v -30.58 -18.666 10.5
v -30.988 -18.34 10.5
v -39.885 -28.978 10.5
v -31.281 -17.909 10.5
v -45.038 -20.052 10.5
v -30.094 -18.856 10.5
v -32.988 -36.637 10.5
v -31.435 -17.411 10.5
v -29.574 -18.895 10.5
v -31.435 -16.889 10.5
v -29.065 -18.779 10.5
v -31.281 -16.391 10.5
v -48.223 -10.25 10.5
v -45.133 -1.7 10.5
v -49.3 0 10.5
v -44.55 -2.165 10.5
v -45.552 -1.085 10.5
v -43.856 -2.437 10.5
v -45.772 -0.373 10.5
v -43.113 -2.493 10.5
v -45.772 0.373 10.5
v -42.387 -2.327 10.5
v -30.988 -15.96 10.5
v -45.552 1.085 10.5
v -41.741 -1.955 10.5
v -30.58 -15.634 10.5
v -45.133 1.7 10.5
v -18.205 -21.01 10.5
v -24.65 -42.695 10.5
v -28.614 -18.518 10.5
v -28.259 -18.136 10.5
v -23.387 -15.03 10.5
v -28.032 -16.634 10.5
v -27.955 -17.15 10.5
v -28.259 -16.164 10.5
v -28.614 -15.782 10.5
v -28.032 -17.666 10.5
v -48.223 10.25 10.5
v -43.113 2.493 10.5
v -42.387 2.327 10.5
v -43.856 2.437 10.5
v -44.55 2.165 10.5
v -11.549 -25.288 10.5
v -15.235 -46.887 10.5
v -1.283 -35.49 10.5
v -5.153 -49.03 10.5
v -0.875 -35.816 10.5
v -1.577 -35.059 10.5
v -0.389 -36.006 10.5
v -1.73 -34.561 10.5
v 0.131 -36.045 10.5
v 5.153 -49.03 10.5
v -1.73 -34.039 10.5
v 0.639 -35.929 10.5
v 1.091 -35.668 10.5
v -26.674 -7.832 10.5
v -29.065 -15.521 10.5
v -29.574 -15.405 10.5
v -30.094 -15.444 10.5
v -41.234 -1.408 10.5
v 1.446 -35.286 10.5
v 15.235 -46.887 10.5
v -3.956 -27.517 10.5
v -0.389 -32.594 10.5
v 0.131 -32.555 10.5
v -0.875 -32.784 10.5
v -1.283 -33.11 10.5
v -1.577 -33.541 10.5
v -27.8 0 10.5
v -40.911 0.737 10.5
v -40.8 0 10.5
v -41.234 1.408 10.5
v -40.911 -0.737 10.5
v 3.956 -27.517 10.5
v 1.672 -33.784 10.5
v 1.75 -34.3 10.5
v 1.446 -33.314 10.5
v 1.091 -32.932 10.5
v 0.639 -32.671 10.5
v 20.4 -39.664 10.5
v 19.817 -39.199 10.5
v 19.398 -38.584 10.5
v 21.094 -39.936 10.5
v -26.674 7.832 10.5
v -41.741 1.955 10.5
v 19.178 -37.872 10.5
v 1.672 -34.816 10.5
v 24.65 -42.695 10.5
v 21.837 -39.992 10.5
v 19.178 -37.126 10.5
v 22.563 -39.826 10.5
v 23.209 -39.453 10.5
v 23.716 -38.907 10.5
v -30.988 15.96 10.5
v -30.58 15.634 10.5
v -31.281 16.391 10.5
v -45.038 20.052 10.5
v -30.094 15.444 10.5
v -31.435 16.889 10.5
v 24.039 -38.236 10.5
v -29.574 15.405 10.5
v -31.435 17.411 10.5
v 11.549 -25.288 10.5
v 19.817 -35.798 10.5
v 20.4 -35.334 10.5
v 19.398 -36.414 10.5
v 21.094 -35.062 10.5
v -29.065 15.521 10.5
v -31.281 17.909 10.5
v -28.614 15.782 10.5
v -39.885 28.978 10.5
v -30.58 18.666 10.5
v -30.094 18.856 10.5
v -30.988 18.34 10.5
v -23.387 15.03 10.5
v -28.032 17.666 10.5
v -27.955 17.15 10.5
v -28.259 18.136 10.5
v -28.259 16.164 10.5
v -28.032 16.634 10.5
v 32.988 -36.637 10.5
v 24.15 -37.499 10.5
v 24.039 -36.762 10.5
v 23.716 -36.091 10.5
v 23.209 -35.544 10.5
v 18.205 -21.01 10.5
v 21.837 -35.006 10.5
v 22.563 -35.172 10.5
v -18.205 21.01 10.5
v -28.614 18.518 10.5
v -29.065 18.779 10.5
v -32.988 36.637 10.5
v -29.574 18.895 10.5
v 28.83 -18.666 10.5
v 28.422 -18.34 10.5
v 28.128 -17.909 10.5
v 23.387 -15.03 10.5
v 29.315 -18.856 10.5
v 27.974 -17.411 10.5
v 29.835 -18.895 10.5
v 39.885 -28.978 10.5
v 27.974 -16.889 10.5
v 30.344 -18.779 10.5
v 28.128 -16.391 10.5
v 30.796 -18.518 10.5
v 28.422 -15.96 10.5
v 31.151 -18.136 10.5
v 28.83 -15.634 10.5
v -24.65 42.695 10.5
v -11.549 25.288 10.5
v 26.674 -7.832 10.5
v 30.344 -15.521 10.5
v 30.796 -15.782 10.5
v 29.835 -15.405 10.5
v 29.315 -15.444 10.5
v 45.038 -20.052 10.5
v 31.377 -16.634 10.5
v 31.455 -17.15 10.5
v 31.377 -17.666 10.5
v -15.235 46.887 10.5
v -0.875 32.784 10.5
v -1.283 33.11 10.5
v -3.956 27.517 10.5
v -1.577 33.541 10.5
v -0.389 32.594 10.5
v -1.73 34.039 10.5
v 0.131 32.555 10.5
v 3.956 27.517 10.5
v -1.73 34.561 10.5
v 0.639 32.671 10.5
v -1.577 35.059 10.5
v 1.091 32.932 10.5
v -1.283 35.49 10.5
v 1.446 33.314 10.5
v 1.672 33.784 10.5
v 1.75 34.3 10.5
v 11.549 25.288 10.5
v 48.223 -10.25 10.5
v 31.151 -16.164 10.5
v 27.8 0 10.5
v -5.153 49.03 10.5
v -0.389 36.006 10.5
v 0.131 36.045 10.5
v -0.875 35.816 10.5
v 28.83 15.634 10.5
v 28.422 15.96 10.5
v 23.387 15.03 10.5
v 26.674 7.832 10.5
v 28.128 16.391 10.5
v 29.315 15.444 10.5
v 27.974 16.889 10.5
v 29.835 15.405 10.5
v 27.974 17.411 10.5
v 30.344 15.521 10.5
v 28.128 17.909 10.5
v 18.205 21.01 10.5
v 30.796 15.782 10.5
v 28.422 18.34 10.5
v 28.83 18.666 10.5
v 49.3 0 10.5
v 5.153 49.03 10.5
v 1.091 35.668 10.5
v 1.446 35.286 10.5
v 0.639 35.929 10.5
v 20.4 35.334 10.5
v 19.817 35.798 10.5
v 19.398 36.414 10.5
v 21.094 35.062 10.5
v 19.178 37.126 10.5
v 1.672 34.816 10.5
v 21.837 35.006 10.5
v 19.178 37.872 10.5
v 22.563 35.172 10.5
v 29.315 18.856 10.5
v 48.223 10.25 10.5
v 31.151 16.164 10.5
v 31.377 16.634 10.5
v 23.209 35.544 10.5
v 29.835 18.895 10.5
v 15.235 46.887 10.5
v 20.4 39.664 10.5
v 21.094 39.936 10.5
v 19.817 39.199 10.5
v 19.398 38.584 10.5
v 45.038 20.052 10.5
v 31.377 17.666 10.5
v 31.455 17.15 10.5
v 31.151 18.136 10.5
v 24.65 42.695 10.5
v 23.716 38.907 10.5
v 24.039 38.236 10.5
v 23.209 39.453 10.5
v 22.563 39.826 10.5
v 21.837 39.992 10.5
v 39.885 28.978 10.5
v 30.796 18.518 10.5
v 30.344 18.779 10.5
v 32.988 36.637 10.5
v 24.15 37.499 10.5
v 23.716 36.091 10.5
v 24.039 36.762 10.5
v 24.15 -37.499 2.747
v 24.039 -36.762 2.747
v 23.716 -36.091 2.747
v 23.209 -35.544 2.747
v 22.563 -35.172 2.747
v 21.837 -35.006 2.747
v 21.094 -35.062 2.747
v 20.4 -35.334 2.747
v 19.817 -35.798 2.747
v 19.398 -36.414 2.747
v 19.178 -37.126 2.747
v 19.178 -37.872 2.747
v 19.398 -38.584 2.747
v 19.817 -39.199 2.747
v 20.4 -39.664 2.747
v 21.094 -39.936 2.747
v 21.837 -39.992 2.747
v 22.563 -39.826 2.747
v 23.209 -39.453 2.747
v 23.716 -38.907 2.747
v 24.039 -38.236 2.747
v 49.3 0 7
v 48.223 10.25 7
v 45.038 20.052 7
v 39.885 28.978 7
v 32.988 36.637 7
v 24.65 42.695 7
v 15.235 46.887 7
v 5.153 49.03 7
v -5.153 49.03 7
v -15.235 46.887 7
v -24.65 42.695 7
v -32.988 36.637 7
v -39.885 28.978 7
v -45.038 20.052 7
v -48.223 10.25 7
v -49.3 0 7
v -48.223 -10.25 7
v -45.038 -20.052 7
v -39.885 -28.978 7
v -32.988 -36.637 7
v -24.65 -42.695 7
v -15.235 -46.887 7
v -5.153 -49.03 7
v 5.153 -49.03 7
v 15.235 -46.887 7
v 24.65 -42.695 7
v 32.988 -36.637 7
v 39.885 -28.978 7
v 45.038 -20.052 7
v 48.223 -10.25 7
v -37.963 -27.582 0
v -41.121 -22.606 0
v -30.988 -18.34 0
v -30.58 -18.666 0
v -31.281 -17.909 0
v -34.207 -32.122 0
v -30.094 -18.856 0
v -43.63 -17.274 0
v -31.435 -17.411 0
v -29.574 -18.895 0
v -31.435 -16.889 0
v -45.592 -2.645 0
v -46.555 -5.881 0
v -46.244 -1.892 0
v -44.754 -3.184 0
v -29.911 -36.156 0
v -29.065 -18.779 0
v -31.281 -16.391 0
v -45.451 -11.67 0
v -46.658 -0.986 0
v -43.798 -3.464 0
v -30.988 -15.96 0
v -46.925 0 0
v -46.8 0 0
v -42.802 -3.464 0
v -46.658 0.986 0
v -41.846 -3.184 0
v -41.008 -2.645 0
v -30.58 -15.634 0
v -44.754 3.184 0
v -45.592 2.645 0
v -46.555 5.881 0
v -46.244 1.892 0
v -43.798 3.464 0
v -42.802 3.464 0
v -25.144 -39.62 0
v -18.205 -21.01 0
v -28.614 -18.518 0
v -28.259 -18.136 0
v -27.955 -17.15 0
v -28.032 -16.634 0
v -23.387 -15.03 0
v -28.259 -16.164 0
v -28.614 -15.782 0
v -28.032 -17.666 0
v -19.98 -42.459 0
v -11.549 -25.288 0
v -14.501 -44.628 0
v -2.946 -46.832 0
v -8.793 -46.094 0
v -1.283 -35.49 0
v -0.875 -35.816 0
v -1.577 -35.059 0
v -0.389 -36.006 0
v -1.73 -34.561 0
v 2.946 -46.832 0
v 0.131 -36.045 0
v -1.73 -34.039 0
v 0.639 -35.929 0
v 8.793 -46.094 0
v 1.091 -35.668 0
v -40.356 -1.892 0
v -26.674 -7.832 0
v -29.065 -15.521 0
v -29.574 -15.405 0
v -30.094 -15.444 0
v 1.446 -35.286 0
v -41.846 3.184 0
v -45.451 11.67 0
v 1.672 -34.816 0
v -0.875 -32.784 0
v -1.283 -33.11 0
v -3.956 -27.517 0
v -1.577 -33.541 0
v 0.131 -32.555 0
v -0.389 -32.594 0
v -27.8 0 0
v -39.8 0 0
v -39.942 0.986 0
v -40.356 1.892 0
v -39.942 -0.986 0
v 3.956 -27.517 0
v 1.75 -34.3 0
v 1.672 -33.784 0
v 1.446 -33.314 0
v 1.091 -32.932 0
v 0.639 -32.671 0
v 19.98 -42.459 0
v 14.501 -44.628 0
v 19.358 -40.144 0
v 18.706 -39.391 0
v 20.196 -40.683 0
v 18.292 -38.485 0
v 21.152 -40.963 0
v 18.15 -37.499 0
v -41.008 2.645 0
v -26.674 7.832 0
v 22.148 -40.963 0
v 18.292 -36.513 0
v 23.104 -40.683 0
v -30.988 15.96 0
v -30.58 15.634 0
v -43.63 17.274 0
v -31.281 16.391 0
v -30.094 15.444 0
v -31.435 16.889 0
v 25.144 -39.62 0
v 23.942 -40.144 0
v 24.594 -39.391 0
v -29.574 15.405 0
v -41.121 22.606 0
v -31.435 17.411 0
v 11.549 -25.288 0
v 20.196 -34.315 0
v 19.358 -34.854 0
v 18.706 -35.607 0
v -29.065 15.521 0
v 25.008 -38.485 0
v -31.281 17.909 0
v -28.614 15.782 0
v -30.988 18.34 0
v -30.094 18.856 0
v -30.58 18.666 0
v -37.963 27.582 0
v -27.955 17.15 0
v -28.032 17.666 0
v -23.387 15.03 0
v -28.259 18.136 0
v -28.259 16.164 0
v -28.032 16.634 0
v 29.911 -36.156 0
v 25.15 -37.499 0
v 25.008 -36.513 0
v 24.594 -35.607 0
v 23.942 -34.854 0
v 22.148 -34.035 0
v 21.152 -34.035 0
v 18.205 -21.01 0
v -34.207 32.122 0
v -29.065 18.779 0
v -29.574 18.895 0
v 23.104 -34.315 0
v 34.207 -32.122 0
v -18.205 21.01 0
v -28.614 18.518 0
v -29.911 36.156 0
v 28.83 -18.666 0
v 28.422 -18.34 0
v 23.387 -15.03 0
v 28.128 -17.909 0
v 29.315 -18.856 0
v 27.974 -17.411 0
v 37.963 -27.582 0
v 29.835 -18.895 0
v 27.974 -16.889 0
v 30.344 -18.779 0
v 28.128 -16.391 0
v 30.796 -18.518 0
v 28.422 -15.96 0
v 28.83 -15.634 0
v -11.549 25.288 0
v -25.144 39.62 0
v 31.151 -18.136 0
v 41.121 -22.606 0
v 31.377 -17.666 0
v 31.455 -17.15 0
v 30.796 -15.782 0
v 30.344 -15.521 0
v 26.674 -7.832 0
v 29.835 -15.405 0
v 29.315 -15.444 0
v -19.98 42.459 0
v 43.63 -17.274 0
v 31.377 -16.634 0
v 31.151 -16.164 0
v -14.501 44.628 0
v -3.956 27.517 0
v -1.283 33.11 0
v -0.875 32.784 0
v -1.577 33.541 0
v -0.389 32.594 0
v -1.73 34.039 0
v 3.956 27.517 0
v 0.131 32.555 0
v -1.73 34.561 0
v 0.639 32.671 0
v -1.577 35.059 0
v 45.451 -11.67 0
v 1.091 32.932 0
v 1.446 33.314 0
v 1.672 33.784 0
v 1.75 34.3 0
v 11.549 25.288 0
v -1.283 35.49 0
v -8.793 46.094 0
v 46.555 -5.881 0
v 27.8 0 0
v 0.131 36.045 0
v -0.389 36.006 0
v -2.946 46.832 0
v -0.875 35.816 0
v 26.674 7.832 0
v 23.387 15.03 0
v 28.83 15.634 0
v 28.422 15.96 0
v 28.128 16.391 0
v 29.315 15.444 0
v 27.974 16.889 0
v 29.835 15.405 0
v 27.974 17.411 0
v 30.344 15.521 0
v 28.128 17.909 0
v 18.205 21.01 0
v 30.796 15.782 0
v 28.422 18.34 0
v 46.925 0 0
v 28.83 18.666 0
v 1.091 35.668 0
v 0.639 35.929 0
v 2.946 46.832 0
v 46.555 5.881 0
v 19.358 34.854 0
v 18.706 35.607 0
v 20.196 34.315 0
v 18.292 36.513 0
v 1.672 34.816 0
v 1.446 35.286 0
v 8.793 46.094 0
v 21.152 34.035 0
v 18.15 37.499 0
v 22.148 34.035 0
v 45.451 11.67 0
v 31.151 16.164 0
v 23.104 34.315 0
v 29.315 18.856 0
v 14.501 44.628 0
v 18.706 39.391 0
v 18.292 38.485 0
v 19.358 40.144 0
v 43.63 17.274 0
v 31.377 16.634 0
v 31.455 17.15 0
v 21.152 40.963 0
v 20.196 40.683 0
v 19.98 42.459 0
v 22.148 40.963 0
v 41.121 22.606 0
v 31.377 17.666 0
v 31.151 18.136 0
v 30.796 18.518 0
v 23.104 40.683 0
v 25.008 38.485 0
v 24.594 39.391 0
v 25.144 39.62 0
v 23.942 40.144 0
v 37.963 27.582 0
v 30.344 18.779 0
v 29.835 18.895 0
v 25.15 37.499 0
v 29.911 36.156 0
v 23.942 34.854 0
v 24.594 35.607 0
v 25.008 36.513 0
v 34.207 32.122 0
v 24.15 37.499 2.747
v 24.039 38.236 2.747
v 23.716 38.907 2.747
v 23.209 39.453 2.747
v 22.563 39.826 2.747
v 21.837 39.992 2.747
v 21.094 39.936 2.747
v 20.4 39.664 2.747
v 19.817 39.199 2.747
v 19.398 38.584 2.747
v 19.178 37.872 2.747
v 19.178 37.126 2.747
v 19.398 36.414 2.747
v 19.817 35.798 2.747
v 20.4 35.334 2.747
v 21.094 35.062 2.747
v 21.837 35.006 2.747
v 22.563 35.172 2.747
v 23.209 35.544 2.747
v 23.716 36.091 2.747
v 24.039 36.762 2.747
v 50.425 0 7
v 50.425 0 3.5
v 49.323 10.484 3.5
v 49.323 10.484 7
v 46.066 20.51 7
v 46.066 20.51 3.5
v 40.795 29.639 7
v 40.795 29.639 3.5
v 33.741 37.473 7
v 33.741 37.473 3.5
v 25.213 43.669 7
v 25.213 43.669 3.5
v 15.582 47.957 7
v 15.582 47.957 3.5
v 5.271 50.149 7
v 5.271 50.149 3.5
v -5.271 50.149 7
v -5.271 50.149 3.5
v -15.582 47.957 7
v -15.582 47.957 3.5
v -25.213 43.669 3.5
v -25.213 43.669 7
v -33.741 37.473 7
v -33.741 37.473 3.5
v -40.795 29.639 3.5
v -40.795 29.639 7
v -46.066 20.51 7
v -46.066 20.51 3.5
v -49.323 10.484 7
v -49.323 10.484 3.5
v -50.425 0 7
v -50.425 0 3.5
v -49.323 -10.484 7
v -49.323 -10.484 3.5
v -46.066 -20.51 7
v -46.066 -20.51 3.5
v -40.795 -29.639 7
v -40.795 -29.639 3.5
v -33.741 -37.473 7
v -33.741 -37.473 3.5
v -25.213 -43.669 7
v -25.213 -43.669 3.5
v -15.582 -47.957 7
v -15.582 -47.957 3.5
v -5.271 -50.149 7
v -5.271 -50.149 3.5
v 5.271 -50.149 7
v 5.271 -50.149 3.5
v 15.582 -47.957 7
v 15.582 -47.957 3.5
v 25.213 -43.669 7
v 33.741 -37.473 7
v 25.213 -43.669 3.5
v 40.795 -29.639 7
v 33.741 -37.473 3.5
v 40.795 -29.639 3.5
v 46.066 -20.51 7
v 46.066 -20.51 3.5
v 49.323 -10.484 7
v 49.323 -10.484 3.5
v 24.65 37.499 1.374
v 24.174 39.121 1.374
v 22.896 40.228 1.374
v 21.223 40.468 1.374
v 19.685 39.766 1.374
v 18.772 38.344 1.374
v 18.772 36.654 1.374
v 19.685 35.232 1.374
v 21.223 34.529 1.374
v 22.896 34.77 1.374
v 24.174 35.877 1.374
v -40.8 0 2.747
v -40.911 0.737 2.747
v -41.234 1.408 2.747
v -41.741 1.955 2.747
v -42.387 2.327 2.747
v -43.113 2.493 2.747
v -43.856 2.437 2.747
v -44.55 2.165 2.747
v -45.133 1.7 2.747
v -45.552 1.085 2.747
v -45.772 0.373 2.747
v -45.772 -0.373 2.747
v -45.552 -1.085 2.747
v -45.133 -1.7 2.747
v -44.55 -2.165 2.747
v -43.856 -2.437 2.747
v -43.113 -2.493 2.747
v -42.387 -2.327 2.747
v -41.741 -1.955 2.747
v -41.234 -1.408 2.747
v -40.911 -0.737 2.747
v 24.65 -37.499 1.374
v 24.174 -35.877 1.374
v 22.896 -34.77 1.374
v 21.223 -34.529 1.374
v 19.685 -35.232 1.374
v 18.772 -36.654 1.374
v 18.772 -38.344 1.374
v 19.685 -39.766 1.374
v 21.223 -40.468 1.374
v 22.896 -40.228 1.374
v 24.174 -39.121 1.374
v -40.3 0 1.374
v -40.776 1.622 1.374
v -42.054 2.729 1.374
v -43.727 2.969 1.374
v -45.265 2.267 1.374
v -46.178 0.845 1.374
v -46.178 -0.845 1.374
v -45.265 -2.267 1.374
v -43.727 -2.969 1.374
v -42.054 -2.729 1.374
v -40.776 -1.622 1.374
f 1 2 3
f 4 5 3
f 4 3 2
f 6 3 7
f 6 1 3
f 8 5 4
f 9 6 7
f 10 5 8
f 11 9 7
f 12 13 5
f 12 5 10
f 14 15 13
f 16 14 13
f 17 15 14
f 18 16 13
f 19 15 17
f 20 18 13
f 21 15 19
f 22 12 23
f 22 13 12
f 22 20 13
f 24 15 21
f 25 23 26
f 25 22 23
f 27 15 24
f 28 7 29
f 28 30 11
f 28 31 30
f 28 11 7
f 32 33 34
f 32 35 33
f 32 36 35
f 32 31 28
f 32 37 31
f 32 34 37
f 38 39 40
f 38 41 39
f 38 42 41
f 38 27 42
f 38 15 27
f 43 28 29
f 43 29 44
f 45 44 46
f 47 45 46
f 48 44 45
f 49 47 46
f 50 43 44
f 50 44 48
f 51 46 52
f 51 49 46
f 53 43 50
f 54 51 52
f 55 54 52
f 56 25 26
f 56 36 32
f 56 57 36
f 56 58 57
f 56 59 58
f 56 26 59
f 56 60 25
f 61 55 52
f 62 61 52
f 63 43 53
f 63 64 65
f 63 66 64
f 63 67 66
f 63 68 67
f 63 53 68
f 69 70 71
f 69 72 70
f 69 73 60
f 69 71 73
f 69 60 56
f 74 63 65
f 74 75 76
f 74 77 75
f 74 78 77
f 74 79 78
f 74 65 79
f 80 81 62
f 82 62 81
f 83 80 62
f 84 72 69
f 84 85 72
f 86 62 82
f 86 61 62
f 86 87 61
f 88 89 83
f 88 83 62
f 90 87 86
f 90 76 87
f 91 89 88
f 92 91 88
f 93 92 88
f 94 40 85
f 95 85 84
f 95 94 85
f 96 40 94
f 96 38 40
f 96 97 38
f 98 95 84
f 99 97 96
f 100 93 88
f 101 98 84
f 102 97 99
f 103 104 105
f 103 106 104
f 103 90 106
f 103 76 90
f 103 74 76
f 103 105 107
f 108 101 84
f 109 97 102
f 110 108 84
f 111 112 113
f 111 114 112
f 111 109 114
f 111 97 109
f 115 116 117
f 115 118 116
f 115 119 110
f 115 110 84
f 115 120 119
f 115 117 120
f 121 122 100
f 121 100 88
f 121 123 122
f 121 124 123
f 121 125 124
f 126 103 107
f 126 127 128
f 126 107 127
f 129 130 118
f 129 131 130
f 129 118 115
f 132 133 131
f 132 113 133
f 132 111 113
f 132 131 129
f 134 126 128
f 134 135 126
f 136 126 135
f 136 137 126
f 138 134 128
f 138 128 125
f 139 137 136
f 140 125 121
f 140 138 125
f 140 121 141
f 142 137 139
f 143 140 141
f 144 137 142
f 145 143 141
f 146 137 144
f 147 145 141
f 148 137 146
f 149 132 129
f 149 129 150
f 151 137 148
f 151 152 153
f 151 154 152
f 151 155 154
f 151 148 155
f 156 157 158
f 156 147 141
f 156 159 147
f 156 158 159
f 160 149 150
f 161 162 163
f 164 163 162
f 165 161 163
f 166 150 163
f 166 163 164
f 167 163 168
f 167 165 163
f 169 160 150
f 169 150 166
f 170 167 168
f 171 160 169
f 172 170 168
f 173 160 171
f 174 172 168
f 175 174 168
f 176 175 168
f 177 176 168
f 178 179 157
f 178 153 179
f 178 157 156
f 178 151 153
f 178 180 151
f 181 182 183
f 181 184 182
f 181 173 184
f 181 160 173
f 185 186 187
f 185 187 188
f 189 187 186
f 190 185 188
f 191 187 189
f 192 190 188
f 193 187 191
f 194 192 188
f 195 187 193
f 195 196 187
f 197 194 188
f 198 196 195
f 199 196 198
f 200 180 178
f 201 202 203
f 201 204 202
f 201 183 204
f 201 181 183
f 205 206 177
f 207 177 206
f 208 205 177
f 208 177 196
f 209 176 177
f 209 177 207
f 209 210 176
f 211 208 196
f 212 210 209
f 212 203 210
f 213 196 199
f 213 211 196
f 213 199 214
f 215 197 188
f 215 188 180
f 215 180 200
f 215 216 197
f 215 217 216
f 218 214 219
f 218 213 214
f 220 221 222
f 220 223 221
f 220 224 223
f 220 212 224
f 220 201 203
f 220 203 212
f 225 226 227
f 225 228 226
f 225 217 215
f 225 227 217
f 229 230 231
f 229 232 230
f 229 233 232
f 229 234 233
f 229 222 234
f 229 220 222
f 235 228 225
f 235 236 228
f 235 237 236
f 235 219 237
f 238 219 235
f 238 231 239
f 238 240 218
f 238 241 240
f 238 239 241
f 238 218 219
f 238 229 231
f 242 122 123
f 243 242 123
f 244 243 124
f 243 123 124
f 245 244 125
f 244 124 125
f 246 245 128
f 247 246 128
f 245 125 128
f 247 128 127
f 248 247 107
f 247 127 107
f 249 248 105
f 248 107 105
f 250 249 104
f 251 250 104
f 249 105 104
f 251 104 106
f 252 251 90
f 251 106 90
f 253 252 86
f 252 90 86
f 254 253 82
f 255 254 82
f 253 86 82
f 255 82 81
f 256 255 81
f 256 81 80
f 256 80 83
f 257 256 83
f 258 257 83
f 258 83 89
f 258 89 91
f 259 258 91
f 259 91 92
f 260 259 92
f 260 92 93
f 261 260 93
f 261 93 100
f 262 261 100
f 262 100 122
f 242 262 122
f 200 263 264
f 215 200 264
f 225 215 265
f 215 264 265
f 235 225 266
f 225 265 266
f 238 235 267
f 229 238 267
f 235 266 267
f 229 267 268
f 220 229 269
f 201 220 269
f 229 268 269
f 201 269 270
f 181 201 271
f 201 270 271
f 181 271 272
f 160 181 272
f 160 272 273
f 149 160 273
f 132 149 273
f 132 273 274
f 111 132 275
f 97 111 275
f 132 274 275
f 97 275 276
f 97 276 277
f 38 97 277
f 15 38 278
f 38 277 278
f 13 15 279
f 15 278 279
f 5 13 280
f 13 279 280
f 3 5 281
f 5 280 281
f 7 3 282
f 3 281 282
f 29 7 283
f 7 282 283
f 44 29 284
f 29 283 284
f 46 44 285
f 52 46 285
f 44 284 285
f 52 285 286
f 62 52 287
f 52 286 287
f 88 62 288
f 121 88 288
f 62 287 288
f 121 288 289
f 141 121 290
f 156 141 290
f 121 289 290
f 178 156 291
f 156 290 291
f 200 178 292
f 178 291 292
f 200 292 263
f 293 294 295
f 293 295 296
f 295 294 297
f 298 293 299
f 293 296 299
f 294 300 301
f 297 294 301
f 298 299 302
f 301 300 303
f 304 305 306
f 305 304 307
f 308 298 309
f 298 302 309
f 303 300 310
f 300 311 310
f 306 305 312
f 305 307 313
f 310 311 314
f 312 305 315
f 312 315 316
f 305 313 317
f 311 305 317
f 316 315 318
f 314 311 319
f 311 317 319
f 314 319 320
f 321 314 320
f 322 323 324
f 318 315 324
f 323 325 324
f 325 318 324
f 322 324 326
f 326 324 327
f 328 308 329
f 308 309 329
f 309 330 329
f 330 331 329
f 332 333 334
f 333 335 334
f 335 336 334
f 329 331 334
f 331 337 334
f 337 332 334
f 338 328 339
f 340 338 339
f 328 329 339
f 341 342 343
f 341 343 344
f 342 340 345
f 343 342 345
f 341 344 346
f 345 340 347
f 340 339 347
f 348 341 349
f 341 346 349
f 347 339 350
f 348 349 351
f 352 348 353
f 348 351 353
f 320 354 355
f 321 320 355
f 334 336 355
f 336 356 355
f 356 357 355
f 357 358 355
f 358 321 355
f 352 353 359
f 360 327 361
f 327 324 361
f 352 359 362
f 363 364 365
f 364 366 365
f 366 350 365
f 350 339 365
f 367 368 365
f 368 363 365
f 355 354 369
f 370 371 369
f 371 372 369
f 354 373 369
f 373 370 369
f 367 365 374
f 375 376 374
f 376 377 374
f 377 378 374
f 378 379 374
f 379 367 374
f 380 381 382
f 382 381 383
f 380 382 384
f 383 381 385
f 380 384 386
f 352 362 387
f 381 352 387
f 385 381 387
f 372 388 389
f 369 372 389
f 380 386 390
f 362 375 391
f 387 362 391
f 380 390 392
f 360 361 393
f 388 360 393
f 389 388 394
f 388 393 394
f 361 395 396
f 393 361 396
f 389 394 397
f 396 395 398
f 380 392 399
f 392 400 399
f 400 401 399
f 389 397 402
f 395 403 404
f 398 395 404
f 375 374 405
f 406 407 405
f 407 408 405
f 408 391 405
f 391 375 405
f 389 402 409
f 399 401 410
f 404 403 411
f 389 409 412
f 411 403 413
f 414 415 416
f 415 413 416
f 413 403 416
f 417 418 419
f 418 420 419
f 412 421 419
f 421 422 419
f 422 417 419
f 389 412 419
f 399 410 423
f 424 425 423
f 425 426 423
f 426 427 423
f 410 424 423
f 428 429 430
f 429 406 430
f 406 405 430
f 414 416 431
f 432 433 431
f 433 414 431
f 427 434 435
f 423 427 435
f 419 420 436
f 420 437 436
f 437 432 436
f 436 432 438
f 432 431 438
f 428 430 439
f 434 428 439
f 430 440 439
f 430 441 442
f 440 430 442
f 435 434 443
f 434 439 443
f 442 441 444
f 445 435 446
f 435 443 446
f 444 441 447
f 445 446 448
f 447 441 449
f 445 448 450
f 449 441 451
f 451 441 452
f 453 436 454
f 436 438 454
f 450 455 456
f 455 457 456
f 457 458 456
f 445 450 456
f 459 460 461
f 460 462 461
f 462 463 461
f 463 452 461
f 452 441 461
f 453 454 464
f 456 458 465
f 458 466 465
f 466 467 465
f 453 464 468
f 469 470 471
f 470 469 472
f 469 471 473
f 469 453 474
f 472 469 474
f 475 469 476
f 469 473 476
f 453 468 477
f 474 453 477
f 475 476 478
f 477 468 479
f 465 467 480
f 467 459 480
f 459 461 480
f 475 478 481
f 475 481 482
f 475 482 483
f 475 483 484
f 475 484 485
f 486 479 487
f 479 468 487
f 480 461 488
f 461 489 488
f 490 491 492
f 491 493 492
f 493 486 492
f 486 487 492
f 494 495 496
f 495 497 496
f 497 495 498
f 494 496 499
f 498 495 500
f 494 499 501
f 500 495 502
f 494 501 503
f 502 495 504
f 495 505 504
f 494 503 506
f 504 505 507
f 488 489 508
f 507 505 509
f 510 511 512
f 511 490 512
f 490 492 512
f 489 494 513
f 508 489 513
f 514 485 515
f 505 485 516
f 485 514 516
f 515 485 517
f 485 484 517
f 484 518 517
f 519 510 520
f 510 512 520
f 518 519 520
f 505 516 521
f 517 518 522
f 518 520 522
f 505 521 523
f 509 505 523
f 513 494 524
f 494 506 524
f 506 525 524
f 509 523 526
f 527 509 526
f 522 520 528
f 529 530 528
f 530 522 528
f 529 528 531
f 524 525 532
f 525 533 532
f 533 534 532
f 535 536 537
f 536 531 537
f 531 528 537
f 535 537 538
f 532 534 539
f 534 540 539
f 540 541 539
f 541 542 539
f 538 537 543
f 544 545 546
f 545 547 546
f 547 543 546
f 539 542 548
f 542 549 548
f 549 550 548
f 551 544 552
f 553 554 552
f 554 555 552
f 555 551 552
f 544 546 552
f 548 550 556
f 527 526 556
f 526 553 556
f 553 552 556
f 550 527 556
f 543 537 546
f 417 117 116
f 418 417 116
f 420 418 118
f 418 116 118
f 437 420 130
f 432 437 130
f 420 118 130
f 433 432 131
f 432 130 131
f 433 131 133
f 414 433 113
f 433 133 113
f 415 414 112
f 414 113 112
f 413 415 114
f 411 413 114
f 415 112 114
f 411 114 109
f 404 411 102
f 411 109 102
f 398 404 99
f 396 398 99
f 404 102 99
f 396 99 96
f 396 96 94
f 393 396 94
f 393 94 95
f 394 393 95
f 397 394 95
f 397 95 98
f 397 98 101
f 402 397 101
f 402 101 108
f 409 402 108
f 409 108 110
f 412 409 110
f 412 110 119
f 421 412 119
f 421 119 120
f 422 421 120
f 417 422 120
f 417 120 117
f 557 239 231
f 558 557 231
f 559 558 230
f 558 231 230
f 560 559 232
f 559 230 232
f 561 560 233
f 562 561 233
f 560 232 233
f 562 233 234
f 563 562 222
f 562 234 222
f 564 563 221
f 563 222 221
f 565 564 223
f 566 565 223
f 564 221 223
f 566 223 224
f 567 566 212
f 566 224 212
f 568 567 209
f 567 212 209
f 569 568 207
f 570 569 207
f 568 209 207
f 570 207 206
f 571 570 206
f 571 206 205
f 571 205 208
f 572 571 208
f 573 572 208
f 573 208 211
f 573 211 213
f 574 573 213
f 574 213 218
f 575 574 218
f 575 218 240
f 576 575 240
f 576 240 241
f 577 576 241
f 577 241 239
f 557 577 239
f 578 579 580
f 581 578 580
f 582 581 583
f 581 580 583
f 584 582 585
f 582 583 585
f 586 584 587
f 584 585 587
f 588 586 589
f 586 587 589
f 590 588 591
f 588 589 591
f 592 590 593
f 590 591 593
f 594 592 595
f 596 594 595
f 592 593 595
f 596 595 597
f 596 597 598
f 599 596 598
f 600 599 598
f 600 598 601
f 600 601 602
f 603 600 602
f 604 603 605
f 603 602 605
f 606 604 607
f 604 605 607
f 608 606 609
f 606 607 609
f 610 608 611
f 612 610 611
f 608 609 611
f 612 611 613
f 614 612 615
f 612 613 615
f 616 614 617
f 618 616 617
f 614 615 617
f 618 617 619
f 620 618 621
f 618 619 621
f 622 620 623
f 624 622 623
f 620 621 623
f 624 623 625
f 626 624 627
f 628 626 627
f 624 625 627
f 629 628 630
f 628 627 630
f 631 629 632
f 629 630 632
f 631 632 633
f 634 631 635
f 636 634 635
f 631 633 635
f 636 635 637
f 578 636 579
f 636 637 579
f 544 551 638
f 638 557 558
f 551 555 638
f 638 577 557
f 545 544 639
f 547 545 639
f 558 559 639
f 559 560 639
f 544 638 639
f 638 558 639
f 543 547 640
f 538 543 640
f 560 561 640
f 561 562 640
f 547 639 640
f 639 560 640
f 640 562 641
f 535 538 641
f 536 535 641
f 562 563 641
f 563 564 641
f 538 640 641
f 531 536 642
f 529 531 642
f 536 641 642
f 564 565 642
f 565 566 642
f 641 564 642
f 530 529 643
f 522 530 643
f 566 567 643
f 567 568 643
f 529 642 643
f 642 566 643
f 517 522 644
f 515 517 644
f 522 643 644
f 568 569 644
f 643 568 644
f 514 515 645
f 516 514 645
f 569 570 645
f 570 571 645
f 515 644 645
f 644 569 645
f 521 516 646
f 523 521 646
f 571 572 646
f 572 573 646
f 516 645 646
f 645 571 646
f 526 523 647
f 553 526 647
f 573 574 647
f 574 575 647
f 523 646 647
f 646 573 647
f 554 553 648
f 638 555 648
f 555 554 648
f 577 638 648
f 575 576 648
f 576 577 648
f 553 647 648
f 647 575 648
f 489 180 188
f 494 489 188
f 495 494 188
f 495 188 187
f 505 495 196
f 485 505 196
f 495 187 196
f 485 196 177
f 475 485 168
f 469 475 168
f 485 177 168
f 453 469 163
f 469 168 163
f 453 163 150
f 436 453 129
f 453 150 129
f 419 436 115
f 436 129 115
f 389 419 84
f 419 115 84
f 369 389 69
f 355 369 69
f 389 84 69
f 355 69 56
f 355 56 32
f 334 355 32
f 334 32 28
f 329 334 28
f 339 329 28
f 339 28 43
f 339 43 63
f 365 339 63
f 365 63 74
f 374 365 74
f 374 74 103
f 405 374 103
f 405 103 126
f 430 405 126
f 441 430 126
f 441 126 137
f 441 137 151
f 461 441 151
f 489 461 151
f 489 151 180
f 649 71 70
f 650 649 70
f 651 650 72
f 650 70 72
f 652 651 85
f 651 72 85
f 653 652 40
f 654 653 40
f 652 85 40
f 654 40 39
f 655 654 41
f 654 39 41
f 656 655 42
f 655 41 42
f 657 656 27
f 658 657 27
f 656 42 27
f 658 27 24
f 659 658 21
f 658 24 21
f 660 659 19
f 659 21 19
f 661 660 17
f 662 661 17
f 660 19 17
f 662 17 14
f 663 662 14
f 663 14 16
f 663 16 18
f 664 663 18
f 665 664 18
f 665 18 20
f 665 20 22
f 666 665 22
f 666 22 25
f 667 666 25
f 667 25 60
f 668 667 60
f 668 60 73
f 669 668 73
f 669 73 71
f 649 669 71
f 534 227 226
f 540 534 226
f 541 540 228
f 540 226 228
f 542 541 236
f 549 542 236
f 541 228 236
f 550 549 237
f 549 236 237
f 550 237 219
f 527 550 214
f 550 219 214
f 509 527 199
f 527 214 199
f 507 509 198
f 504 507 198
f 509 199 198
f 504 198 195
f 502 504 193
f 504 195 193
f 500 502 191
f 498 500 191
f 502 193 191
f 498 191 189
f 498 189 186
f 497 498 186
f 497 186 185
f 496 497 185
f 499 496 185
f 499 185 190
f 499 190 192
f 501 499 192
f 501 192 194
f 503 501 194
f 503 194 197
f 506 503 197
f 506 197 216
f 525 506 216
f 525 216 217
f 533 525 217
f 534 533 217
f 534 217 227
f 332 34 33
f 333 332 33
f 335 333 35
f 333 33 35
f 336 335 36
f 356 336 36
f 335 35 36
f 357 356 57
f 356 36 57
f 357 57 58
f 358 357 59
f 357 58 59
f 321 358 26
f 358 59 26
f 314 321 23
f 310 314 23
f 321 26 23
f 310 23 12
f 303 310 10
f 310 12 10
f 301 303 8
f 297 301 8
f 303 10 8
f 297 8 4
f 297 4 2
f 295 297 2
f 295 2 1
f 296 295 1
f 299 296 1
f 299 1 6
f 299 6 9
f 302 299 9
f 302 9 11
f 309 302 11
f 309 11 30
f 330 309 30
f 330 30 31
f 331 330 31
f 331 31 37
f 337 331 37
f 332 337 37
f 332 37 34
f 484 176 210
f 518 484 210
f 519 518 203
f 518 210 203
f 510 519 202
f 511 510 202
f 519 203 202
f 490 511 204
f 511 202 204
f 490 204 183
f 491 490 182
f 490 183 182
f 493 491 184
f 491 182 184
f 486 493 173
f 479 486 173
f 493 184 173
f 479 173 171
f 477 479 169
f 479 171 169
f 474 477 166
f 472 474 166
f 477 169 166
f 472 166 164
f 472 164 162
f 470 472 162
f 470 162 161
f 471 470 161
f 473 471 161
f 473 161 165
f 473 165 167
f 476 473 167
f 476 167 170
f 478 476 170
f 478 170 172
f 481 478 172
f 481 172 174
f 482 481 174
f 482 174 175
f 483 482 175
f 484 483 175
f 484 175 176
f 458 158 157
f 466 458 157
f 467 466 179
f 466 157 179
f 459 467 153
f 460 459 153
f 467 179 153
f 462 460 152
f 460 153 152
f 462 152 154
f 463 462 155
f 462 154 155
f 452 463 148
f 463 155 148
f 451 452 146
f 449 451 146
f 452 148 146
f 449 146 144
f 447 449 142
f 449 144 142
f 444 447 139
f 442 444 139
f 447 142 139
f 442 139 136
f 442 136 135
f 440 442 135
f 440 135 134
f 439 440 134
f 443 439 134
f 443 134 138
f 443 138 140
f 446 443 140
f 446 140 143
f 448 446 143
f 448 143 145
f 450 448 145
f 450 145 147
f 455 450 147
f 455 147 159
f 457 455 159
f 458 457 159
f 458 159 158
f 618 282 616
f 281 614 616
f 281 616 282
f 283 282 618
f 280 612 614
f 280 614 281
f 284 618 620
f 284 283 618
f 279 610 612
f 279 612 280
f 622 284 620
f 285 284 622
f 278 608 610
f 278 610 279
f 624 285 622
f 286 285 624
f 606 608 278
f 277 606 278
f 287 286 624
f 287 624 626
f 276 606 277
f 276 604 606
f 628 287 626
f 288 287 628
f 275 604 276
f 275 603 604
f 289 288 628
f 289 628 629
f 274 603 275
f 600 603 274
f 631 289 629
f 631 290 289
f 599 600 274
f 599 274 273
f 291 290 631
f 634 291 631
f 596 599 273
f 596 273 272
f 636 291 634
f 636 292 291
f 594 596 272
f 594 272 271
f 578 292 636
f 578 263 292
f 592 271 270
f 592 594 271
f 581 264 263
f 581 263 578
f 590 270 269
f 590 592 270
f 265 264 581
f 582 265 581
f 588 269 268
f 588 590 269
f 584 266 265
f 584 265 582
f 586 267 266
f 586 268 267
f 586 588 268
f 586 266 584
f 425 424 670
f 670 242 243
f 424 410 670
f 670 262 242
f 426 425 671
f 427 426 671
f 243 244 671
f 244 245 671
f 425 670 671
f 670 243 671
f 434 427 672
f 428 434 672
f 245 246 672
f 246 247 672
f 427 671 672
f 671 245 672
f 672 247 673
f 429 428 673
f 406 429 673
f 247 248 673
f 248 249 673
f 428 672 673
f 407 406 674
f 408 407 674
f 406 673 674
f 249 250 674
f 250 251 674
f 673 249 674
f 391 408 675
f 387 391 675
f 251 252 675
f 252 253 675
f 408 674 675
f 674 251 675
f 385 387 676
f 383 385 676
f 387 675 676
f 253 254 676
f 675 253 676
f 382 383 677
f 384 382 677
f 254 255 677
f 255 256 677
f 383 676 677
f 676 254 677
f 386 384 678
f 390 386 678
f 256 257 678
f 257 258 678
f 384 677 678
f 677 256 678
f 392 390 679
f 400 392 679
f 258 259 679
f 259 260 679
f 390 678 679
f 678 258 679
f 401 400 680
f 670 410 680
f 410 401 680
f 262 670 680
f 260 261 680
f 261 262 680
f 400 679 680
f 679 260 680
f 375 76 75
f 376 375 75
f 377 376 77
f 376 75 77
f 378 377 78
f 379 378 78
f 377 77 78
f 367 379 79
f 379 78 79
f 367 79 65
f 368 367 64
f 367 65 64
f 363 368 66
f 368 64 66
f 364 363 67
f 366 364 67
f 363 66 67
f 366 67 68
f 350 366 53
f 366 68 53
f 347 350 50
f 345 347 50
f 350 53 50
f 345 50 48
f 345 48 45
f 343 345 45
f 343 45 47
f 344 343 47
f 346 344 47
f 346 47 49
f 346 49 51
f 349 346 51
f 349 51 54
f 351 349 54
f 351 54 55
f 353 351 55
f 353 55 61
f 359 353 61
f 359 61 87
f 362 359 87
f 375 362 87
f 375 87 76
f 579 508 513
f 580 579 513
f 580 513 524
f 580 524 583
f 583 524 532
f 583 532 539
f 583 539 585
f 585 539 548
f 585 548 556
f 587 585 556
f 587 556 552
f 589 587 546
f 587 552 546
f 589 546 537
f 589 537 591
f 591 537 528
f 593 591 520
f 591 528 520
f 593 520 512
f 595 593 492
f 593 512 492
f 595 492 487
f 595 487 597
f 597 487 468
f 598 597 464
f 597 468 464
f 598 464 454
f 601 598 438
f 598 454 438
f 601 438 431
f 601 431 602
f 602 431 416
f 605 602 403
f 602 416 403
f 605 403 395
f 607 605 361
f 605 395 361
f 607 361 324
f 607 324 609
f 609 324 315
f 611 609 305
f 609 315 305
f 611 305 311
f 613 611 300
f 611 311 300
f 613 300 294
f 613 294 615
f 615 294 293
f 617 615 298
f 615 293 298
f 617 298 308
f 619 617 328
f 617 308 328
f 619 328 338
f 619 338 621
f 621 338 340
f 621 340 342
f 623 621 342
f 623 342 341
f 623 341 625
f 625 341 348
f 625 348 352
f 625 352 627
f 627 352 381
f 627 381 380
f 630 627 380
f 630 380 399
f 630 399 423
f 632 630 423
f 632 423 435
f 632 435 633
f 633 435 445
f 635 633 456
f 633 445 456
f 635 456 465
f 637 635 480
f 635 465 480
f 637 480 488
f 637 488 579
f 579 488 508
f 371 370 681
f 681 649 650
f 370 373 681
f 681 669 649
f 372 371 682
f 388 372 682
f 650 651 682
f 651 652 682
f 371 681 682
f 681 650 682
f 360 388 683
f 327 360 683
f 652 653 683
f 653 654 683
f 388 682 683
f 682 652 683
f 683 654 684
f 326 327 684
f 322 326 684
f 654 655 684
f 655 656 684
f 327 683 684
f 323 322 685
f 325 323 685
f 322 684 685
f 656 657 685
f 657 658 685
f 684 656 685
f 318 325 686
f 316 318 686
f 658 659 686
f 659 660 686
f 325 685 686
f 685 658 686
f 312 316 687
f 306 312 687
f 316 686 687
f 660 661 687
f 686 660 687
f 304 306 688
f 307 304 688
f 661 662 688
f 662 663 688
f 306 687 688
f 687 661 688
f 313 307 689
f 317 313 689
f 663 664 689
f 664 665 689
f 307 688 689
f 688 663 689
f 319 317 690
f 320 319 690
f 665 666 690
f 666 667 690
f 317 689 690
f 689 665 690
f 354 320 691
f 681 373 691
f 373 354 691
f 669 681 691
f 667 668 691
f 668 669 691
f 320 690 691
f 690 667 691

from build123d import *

# Parameters (mm, degrees)
SKETCH_R         = 50.425
PAD_DEPTH        = 7
SKETCH001_R      = 49.3
PAD001_DEPTH     = 3.5
CHAMFER_SIZE     = 3.5
SKETCH002_R      = 27.8
SKETCH002_R_2    = 2.5
SKETCH002_R_3    = 1.75
POCKET_DEPTH     = 10.501
CHAMFER001_ANGLE = 70
CHAMFER001_SIZE  = 1


with BuildPart() as part:
    # Sketch → Pad (new body)
    with BuildSketch(Plane.XY):
        Circle(SKETCH_R)
    extrude(amount=PAD_DEPTH)

    # Sketch001 (on Face3 of Pad) → Pad001 (join)
    with BuildSketch(Plane.XY.offset(7)):
        Circle(SKETCH001_R)
    extrude(amount=PAD001_DEPTH)

    # Chamfer
    chamfer_edges = [part.edges().sort_by_distance(p)[0] for p in [
        (-50.425, 0, 0),
    ]]
    chamfer(chamfer_edges, length=CHAMFER_SIZE)

    # Sketch002 (on Face6 of Chamfer) → Pocket (cut, through all)
    with BuildSketch(Plane.XY.offset(10.5)):
        Circle(SKETCH002_R)
        with Locations((-43.3, 0)):
            Circle(SKETCH002_R_2)
        with Locations((21.65, 37.4989)):
            Circle(SKETCH002_R_2)
        with Locations((21.65, -37.4989)):
            Circle(SKETCH002_R_2)
        with Locations((-29.704671, 17.15)):
            Circle(SKETCH002_R_3)
        with Locations((0, 34.3)):
            Circle(SKETCH002_R_3)
        with Locations((29.704671, 17.15)):
            Circle(SKETCH002_R_3)
        with Locations((29.704671, -17.15)):
            Circle(SKETCH002_R_3)
        with Locations((0, -34.3)):
            Circle(SKETCH002_R_3)
        with Locations((-29.704671, -17.15)):
            Circle(SKETCH002_R_3)
    extrude(amount=-POCKET_DEPTH, mode=Mode.SUBTRACT)

    # Chamfer001
    chamfer001_edges = [part.edges().sort_by_distance(p)[0] for p in [
        (19.15, -37.4989, 0),
        (-45.8, 0, 0),
        (19.15, 37.4989, 0),
    ]]
    chamfer001_side = part.faces().sort_by_distance((-46.792276, 0, 0))[0]
    chamfer(chamfer001_edges, length=CHAMFER001_SIZE, angle=CHAMFER001_ANGLE, reference=chamfer001_side)


solid = part.part
